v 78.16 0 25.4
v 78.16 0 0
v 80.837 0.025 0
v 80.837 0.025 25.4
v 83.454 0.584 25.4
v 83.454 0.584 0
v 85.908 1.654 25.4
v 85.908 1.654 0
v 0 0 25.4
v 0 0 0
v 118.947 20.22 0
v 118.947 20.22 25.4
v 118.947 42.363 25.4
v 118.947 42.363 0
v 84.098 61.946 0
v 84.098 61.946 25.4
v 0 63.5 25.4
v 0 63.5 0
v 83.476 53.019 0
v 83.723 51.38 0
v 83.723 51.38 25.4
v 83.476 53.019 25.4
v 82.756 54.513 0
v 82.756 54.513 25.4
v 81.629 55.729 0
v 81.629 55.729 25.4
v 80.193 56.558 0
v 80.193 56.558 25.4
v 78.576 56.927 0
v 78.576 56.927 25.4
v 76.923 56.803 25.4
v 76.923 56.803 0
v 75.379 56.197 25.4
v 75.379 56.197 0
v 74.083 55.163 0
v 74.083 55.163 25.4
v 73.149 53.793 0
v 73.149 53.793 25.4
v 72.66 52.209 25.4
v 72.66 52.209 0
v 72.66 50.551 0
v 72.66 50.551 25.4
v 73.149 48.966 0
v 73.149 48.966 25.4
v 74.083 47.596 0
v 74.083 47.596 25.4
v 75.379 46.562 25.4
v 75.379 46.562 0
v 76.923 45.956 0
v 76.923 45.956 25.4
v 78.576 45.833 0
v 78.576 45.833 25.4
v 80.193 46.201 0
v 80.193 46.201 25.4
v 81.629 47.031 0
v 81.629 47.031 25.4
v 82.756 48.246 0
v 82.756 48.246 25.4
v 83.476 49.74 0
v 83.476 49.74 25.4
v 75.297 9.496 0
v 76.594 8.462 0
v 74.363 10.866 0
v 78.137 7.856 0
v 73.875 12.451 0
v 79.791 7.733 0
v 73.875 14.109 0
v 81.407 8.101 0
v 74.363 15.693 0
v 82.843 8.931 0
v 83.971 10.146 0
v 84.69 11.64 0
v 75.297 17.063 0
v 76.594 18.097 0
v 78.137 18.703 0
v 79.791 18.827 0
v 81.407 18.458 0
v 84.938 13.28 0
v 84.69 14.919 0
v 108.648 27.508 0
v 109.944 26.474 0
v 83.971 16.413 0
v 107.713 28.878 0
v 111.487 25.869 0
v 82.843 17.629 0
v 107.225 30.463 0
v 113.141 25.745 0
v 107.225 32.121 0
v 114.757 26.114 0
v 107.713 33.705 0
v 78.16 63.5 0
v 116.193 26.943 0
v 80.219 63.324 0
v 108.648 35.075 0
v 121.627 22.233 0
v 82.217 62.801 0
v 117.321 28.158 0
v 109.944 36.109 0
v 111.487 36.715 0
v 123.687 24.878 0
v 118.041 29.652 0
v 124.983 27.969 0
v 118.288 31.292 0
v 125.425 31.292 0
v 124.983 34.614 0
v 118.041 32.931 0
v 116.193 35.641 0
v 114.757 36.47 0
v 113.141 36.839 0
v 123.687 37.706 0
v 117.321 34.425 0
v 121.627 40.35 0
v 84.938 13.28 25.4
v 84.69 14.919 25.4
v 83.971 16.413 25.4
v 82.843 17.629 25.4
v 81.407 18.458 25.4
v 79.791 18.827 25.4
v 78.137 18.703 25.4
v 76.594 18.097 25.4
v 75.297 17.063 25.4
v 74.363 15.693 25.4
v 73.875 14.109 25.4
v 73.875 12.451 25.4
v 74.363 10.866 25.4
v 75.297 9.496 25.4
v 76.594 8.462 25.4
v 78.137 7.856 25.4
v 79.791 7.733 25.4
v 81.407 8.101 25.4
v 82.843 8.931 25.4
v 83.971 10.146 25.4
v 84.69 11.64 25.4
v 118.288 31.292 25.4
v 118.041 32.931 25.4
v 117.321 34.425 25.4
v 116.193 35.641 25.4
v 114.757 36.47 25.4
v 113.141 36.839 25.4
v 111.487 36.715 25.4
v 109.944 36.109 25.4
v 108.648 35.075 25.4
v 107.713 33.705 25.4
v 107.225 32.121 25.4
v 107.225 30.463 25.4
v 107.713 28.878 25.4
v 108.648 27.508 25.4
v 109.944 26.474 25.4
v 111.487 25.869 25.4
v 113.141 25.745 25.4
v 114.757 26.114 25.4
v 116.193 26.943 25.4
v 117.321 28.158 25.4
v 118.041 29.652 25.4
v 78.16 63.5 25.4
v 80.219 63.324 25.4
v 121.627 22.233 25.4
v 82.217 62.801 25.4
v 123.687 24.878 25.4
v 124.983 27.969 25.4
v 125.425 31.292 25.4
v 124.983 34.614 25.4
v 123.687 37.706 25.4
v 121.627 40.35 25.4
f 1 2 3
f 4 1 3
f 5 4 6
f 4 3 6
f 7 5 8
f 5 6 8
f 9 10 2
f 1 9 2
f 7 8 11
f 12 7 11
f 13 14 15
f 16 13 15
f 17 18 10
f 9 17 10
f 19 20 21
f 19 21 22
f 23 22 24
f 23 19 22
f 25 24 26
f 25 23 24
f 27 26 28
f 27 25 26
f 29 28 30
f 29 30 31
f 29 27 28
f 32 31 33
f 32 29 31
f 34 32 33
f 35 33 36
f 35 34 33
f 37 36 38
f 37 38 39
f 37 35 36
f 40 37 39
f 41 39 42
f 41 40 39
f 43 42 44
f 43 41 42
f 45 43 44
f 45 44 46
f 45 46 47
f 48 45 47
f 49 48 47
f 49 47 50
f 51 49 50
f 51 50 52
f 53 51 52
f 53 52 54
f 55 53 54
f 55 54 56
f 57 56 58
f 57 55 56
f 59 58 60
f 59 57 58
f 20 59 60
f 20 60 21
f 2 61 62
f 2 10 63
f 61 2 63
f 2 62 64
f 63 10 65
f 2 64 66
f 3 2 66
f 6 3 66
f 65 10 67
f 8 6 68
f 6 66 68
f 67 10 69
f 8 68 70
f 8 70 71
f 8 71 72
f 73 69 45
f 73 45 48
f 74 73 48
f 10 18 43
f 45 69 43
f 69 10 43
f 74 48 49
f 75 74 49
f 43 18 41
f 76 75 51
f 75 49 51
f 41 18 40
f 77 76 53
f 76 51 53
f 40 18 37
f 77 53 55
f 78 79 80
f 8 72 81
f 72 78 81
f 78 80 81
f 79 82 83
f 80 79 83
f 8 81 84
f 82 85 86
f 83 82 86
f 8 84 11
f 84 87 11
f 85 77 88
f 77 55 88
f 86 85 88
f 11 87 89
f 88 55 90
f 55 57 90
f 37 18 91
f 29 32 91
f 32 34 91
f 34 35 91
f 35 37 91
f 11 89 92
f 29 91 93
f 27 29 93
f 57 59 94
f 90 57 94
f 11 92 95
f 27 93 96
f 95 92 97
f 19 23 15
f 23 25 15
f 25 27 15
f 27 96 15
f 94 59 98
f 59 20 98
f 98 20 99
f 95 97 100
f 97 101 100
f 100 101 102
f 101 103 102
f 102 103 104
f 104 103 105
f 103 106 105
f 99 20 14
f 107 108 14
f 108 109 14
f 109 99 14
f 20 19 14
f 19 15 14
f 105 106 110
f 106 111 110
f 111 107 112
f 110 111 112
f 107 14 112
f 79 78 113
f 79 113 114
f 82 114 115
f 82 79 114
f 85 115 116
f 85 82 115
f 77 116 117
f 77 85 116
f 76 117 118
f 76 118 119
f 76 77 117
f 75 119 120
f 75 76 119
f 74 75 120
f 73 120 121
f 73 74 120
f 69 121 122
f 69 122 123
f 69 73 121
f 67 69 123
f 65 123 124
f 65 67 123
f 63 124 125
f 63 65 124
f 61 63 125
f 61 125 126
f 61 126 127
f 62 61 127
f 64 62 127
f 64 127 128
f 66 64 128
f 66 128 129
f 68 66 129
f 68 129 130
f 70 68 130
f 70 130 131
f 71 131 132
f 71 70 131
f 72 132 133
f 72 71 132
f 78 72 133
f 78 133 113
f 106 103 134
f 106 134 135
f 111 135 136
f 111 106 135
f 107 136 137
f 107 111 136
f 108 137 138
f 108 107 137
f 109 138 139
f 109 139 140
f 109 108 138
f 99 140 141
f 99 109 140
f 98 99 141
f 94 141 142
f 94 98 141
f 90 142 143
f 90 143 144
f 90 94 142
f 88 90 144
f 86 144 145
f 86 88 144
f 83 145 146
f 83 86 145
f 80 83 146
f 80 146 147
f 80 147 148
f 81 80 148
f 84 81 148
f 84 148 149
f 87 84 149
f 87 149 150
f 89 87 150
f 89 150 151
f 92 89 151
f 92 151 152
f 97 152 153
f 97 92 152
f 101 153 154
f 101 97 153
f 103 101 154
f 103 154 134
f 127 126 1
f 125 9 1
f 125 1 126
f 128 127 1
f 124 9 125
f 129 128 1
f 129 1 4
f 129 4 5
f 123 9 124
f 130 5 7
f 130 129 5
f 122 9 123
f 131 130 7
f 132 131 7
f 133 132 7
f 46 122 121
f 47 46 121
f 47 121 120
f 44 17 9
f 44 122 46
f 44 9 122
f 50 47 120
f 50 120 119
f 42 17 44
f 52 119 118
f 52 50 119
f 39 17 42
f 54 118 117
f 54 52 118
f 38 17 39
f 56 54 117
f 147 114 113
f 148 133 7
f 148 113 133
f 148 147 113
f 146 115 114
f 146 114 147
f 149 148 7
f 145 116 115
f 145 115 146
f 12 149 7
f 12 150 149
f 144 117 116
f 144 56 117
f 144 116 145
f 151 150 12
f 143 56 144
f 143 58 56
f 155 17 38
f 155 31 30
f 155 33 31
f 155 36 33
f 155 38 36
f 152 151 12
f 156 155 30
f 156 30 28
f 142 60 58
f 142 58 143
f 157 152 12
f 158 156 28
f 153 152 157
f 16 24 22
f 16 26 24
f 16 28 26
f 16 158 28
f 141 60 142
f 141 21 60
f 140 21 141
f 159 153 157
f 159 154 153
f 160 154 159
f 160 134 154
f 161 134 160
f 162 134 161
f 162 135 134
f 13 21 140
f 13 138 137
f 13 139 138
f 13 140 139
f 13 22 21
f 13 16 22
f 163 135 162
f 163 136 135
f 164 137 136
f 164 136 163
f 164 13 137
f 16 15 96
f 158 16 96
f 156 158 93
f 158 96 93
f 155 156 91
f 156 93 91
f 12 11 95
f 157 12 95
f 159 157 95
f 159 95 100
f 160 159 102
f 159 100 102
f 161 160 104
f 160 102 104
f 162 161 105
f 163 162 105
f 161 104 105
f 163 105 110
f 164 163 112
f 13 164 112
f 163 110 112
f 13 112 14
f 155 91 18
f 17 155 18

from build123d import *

# Parameters (mm, degrees)
F0_R     = 5.5626
F1_DEPTH = 25.4


with BuildPart() as f1:
    # F0 (on Top) → F1 (new body)
    with BuildSketch(Plane.XY):
        with BuildLine():
            Line((78.160428, 63.5), (0, 63.5))
            Line((0, 63.5), (0, 0))
            Line((0, 0), (78.160428, 0))
            ThreePointArc((78.160428, 0), (69.525671, 4.28997), (66.04, 13.279572))
            Line((66.04, 13.279572), (66.04, 51.379572))
            ThreePointArc((66.04, 51.379572), (69.589991, 59.950009), (78.160428, 63.5))
        make_face()
        with BuildLine():
            ThreePointArc((84.098042, 61.946005), (81.229229, 63.105067), (78.160428, 63.5))
            ThreePointArc((78.160428, 63.5), (69.589991, 59.950009), (66.04, 51.379572))
            Line((66.04, 51.379572), (66.04, 13.279572))
            ThreePointArc((66.04, 13.279572), (69.525671, 4.28997), (78.160428, 0))
            ThreePointArc((78.160428, 0), (82.159702, 0.238573), (85.907615, 1.654291))
            Line((85.907615, 1.654291), (118.946738, 20.220023))
            ThreePointArc((118.946738, 20.220023), (125.4252, 31.29172), (118.946738, 42.363416))
            Line((118.946738, 42.363416), (84.098042, 61.946005))
        make_face()
        with Locations((79.375, 13.279572)):
            Circle(F0_R, mode=Mode.SUBTRACT)
        with Locations((112.7252, 31.29172)):
            Circle(F0_R, mode=Mode.SUBTRACT)
        with Locations((78.160428, 51.379572)):
            Circle(F0_R, mode=Mode.SUBTRACT)
    extrude(amount=F1_DEPTH)


solid = f1.part
